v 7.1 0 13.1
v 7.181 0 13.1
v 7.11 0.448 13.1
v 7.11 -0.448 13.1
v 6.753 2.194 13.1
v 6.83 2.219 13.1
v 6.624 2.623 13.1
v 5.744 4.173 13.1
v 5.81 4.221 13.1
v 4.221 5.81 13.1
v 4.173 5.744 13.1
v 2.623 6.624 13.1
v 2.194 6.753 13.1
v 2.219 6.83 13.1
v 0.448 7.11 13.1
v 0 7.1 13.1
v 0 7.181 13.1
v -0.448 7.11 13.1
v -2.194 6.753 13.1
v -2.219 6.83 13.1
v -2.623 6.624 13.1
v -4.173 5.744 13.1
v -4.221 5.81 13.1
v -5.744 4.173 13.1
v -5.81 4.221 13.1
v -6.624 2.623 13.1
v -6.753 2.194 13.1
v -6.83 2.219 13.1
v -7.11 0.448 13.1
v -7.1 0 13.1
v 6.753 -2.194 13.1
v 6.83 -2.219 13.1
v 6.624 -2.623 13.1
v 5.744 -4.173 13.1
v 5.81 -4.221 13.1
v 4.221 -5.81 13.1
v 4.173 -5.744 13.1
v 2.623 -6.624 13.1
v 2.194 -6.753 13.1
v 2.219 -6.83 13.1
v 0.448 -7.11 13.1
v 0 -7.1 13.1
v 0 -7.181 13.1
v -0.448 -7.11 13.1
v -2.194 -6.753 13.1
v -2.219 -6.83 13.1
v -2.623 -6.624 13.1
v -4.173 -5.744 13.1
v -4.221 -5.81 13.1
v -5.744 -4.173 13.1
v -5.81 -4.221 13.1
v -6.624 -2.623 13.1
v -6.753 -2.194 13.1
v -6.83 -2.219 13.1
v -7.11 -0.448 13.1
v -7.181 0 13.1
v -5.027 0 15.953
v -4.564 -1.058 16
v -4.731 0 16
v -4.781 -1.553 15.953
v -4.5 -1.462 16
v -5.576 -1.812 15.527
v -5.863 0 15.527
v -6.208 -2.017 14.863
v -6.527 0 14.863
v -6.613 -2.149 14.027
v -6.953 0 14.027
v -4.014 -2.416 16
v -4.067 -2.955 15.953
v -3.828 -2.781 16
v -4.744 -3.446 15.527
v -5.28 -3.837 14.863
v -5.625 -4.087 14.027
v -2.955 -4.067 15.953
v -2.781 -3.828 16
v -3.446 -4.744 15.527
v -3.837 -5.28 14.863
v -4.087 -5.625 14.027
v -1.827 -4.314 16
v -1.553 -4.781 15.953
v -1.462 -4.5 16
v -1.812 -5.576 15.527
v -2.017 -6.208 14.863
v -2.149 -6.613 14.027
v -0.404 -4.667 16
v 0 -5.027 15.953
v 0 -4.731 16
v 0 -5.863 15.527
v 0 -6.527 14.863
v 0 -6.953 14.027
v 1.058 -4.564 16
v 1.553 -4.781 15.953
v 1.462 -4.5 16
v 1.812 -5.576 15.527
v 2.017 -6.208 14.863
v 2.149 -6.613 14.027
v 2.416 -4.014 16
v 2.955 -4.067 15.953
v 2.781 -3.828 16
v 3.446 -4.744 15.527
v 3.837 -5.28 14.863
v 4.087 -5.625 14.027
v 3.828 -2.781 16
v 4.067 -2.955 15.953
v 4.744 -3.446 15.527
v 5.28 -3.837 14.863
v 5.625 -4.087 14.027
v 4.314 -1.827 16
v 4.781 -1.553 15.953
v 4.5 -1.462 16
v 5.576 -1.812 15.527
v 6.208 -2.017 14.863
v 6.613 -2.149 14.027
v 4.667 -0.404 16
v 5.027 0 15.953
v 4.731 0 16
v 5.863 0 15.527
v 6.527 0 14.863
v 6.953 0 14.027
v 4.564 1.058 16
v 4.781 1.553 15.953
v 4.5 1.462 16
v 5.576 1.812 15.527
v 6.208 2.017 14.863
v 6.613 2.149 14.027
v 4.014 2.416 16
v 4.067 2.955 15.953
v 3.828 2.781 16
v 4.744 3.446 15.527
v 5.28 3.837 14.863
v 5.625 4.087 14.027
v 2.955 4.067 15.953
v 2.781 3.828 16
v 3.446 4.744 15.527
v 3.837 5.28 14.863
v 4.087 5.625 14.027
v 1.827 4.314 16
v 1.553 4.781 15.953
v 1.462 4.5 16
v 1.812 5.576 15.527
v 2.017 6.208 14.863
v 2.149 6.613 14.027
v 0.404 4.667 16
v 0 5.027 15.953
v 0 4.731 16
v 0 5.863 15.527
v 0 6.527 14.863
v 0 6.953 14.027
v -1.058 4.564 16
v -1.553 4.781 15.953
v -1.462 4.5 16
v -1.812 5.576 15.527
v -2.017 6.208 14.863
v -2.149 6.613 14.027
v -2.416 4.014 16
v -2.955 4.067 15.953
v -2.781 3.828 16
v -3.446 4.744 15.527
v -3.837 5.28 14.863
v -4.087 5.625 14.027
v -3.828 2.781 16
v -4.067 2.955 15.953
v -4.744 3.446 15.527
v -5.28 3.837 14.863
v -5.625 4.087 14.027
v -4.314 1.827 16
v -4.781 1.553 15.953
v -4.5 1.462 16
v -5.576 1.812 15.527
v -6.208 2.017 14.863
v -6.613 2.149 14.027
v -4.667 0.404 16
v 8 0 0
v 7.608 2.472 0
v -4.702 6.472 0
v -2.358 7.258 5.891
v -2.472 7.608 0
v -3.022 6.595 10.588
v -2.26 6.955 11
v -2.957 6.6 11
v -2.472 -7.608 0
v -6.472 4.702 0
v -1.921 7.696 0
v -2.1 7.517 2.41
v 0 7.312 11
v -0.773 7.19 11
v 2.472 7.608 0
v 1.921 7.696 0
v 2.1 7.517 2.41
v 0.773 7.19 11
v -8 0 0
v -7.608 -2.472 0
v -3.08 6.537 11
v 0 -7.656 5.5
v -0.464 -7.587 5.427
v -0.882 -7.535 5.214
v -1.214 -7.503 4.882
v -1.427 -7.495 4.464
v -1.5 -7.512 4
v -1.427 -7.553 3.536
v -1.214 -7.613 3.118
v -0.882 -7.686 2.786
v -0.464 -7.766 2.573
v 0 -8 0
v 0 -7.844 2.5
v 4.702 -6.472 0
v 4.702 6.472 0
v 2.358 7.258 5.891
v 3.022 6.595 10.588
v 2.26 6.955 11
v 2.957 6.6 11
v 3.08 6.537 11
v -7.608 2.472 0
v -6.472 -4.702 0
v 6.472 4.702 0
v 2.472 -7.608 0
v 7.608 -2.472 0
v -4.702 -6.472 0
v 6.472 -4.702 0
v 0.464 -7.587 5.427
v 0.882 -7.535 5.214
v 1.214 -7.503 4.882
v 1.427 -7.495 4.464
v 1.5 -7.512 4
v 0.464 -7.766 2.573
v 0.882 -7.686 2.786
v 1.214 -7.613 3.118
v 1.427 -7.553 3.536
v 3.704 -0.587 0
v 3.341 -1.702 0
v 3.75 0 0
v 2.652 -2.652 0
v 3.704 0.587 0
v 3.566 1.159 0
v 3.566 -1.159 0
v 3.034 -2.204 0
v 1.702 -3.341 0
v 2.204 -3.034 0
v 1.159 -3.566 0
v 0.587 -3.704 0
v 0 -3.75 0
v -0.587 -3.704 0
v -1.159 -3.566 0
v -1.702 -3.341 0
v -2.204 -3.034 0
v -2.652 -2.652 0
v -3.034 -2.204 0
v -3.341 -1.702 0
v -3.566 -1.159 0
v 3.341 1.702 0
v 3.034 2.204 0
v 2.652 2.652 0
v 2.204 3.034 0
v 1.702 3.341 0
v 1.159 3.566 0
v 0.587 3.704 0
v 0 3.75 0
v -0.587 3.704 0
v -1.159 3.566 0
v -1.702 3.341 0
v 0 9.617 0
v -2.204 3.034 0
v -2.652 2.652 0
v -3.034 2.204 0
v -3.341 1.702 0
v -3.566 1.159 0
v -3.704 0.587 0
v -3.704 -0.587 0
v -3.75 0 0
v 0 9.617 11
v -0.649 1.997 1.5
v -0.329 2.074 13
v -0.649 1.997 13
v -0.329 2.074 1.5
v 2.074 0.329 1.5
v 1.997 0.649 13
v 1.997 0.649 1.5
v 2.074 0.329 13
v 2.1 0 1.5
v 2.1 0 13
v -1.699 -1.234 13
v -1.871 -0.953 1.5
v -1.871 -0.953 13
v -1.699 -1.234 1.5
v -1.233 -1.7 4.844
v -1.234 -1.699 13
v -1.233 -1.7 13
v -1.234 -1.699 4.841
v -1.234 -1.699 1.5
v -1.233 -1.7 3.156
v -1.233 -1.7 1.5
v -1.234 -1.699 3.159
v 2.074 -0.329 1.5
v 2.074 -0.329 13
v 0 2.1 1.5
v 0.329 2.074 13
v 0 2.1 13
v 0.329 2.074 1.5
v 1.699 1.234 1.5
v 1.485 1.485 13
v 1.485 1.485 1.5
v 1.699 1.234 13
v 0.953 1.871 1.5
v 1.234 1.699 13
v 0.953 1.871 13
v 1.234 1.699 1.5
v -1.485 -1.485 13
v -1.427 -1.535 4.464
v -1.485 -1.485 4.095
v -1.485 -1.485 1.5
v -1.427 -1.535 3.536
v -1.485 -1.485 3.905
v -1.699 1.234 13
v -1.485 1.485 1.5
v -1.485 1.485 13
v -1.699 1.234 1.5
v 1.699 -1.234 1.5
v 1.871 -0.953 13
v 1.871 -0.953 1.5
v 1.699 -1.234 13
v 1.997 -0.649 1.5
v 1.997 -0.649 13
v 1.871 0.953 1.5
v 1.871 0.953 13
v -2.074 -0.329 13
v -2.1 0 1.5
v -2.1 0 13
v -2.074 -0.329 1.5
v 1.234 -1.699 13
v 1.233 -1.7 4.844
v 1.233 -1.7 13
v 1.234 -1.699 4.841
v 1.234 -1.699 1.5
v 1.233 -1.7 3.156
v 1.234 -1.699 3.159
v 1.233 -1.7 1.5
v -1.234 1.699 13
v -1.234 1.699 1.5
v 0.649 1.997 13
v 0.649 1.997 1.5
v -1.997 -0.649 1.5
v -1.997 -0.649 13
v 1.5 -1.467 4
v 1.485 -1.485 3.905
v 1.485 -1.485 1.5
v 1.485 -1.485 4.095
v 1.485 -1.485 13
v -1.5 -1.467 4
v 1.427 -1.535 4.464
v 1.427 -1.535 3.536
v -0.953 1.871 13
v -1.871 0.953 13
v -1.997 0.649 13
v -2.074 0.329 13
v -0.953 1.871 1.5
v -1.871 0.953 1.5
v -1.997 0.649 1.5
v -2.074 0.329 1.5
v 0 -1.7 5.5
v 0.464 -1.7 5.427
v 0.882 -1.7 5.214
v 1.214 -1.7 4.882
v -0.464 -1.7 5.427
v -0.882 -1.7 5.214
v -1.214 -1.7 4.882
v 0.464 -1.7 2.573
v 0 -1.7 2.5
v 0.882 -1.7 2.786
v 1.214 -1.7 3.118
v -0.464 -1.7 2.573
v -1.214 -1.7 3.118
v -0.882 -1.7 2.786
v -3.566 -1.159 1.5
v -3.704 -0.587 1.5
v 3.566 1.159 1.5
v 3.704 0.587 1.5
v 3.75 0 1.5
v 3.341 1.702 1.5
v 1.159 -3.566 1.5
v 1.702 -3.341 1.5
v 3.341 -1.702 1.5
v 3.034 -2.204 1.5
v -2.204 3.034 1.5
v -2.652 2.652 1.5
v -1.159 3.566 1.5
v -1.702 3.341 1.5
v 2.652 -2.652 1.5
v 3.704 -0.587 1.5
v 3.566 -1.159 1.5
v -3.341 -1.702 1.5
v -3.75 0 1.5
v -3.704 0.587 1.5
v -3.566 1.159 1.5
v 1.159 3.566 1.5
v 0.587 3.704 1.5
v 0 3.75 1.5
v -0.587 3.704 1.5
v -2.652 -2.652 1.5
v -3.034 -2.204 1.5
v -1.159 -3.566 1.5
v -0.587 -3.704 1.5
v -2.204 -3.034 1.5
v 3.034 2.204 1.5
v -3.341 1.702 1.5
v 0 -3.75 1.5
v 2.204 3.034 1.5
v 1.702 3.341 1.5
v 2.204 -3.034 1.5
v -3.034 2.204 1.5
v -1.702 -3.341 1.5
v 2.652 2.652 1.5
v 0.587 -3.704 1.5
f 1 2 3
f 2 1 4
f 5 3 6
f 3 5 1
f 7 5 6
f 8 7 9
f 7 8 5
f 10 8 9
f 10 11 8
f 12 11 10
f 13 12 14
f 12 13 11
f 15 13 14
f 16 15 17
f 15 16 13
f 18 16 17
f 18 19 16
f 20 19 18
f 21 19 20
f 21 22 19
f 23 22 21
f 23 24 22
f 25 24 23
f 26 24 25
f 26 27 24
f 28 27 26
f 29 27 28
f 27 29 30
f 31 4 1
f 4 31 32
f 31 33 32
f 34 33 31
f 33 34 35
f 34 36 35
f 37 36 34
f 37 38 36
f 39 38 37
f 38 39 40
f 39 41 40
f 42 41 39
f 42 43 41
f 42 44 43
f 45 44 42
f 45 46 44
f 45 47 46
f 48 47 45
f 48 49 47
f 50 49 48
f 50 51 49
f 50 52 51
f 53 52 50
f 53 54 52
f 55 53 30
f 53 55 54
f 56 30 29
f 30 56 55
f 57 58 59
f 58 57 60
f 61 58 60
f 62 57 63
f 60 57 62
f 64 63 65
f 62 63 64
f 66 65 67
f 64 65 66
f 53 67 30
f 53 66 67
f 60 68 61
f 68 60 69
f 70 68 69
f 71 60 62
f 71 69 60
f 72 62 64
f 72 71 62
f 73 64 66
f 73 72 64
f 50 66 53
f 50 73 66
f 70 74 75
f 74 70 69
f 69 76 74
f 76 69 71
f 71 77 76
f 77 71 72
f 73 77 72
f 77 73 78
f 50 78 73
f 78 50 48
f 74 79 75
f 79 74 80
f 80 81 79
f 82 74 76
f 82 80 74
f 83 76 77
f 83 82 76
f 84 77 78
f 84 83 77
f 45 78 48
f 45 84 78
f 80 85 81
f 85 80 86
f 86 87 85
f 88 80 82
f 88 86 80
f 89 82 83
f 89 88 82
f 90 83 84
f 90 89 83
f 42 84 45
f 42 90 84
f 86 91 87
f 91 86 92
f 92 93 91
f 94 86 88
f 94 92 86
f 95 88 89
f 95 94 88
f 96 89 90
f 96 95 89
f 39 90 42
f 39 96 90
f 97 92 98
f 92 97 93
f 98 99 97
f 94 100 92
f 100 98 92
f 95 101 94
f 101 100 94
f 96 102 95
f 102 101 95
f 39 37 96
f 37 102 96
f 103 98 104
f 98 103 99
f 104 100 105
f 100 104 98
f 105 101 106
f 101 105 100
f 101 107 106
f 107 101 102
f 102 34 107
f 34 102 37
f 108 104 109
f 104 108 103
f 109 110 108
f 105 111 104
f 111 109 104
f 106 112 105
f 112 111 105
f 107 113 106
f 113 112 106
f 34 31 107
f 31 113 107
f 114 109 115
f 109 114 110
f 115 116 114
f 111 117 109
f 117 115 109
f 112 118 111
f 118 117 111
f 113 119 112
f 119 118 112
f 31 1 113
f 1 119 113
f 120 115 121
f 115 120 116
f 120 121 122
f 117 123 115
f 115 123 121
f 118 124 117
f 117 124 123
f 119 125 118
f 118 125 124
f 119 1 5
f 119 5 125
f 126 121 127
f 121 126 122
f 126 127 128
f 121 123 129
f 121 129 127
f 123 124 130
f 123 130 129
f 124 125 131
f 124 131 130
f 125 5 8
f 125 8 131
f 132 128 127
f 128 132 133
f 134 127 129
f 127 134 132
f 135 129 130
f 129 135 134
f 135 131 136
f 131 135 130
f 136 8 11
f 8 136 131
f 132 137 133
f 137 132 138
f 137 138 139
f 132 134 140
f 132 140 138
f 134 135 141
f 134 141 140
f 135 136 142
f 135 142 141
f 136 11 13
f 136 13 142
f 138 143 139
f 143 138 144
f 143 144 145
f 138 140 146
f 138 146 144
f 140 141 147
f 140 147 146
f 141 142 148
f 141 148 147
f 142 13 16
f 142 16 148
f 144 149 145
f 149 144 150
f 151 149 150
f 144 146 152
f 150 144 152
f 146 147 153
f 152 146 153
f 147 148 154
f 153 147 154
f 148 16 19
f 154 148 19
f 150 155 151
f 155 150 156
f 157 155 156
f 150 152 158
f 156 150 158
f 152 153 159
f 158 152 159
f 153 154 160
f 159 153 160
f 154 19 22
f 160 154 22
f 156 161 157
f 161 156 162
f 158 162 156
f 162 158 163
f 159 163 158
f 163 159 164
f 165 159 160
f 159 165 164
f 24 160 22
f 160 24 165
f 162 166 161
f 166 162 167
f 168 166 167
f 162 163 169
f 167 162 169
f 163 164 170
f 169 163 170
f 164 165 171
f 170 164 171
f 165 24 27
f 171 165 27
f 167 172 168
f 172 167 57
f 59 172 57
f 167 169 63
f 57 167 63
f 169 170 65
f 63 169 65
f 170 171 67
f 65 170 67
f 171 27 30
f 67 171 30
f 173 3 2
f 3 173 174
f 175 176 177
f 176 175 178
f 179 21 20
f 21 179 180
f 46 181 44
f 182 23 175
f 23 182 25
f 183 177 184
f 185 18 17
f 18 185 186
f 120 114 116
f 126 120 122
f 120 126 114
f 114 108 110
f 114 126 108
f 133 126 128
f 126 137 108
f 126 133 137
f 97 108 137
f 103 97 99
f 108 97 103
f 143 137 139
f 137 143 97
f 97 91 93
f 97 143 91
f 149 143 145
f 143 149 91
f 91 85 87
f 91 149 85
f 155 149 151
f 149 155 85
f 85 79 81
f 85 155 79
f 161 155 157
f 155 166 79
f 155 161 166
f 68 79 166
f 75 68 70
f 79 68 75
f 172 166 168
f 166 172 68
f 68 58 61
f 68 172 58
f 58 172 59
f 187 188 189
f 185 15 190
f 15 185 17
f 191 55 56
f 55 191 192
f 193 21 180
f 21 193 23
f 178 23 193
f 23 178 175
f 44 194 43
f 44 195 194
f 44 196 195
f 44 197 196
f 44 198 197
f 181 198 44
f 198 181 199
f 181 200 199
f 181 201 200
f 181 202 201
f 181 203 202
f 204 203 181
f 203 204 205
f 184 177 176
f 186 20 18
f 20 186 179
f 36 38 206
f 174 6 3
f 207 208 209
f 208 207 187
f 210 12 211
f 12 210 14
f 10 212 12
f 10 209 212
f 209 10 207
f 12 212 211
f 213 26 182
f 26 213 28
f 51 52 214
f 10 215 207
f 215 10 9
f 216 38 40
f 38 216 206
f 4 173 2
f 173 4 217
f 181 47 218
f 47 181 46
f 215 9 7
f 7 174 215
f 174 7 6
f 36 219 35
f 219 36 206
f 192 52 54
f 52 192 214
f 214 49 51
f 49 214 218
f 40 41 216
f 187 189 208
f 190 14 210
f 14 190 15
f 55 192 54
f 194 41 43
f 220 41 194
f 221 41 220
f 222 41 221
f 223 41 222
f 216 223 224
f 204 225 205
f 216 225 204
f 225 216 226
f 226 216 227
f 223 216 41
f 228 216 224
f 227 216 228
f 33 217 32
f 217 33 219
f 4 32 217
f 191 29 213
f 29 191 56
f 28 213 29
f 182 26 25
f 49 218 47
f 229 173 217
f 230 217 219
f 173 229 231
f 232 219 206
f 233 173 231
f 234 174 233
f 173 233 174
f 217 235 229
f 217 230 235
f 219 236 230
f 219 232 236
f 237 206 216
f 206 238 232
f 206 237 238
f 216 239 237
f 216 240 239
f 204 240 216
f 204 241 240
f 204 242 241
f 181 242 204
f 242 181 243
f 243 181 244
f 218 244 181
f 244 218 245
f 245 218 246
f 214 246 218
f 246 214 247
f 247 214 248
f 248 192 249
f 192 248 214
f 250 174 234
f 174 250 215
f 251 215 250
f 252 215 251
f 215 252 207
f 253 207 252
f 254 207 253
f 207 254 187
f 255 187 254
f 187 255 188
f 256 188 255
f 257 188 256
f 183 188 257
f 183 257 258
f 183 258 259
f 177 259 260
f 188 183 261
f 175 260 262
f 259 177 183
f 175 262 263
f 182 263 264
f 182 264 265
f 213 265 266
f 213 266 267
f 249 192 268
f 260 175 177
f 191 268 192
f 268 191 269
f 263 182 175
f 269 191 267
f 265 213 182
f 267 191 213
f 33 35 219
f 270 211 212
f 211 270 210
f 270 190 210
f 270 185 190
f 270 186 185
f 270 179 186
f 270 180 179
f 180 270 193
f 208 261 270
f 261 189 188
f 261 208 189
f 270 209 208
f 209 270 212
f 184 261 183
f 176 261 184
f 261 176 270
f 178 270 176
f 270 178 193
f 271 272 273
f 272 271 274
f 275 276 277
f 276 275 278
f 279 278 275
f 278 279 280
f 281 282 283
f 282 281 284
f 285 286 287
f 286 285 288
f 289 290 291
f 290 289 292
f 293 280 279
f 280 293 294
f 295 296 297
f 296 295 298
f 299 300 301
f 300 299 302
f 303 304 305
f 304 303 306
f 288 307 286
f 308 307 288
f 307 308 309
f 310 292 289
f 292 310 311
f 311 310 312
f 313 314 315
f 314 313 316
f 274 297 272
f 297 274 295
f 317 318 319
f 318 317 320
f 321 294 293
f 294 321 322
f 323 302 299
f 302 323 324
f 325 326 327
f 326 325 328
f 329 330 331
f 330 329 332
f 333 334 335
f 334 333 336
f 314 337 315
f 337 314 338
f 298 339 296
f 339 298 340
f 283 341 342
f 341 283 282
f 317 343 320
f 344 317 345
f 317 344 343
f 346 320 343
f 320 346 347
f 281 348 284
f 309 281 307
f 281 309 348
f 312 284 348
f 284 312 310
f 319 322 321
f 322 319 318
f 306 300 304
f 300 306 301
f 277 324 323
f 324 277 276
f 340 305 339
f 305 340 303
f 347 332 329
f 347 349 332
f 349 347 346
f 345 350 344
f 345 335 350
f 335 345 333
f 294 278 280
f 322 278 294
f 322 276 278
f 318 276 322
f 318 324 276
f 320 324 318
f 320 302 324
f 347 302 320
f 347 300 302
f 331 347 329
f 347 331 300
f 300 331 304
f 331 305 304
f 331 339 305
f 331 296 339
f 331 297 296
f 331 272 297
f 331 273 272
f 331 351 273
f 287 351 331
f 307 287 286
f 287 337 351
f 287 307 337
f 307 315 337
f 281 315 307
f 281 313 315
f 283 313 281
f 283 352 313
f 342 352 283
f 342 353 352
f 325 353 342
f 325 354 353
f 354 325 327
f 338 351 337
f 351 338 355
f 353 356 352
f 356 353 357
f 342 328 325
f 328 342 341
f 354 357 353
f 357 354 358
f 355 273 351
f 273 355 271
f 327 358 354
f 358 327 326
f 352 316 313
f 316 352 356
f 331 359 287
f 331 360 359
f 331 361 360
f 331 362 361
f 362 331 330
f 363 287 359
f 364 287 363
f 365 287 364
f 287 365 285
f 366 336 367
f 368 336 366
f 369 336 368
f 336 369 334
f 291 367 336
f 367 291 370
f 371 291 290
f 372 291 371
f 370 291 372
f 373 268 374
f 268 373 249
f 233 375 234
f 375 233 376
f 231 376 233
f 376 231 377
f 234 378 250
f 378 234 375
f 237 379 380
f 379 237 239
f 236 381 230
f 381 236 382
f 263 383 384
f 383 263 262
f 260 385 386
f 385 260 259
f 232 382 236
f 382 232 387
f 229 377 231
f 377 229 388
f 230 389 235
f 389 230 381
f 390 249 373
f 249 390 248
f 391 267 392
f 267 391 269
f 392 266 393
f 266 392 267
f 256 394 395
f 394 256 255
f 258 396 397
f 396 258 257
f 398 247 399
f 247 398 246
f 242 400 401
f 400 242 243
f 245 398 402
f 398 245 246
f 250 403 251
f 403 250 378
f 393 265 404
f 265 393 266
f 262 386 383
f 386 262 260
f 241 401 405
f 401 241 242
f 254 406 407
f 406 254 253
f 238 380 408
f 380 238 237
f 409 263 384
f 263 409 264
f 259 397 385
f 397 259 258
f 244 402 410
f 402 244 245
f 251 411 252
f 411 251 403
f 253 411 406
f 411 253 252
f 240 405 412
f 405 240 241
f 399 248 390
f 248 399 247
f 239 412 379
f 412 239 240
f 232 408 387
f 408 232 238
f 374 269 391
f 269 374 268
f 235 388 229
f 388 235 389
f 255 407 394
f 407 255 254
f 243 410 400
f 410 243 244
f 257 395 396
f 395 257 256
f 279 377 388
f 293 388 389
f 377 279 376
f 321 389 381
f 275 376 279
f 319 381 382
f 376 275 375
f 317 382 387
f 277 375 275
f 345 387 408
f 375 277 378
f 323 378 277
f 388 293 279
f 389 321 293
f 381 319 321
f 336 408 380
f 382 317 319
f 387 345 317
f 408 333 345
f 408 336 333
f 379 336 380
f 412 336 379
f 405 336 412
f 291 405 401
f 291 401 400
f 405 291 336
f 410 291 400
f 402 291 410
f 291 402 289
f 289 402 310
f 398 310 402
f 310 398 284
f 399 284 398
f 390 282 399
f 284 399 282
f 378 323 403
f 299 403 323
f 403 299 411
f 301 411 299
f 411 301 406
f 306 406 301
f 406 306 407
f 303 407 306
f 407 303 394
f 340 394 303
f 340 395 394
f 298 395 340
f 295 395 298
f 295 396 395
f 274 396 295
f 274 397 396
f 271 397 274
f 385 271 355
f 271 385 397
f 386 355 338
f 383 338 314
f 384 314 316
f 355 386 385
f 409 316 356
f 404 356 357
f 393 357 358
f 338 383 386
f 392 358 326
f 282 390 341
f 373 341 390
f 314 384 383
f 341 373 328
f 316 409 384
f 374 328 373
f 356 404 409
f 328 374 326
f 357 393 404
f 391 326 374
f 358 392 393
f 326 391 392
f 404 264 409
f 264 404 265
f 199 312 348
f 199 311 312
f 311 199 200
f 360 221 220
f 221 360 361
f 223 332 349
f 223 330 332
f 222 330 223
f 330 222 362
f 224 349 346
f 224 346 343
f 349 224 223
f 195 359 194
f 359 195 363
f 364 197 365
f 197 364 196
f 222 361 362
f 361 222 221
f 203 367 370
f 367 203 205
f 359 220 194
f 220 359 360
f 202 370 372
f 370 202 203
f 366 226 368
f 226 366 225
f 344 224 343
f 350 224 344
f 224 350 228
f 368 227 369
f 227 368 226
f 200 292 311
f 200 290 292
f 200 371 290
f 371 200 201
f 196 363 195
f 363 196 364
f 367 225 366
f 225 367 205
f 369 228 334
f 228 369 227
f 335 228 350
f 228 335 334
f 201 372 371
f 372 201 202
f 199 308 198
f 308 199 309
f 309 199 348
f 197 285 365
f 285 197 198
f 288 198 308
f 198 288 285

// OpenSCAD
/*

Parametric Potentiometer Knob Generator
version 1.1
2012 Steve Cooley
http://sc-fa.com
http://beatseqr.com
http://hapticsynapses.com

parametric potentiometer knob generator by steve cooley is licensed under a Creative Commons Attribution-NonCommercial-ShareAlike 3.0 Unported License. Based on a work at sc-fa.com. Permissions beyond the scope of this license may be available at http://sc-fa.com/blog/contact.

view terms of the license here:
http://creativecommons.org/licenses/by-nc-sa/3.0/


version history
---------------
1.1 2012-04-12 fixed the arrow indicator code to be more robust and easier to adjust parameters for.
1.0 2012-03-?? initial release.


*/


//
//
// Physical attributes, basic
//
//

knob_radius_top = 7;
knob_radius_bottom = 8;
knob_height = 16;
knob_smoothness = 20;

outer_shaft=true;
outer_shaft_radius = 3.75;
outer_shaft_height = 2.5;
outer_shaft_smoothness = 40;

shaft_radius = 2.1;
shaft_height = 14;
shaft_smoothness = 40;

outer_shaft_is_flatted = false;
shaft_is_flatted = true;
flat_size_adjustment = -0.0;
// you won't need to mess with this. less than 5 makes it disappear. you can, however,
// set the adjustment to be a negative decimal if you need a flat but not as big as the default. 
// go positive if you need a bigger flat
flat_size = 5.8 + flat_size_adjustment;

// some potentiometers need to have their knobs affixed with a set screw.
set_screw = true;
set_screw_radius = 1.5;
set_screw_depth = 11;
set_screw_height = 4;
quality_of_set_screw = 20;

//
// 
// Decorations
//
//

//
// top edge smoothing
// thanks to http://www.iheartrobotics.com/ for the articles!
//

smoothing = true;
smoothing_radius = 3;				// tweak on this one, how much smoothing to apply
smooth = 20;						// tweak on this one, Number of facets of rounding cylinder

ct = -0.1; 							// circle translate? not sure.
circle_radius = knob_radius_top;  	// just match the top edge radius
circle_height = 1; 					// actually.. I don't know what this does.
pad = 0.2;							// Padding to maintain manifold


//
// directional indicators
//

// this is a corner edge of a cube sticking out of the cylinder at the bottom
// you can use it instead of the arrow shaped cutout in the top if you like. Or both.

pointy_external_indicator = true;
pointy_external_indicator_height = 11;
pointy_external_indicator_pokey_outey_ness = -0.0; // 
pokey_outey_value = pointy_external_indicator_pokey_outey_ness - 1 - pad;
pokey_outey = [pokey_outey_value, pokey_outey_value,0];

// there's an arrow shaped hole you can have. There aren't a lot of controls for this.
// please feel free to improve on this script here.

arrow_indicator = false;
arrow_indicator_scale = 1.3;
arrow_indicator_translate = [0,1,16];
arrow_scale_head = 2;
arrow_scale_shaft = 1.5;

//
// indentations
//

// for spherical indentations, set the quantity, quality, size, and adjust the placement
indentations_sphere = false;
sphere_number_of_indentations = 12;
sphere_quality_of_indentations = 4;
size_of_sphere_indentations = 4;
// the first number in this set moves the spheres in or out. smaller is closer to the middle
// the second number in this set moves the spheres left or right
// the third number in this set moves the speheres up or down
translation_of_sphere_indentations = [10,0,15];
// in case you are using an odd number of indentations, you way want to adjust the starting angle
// so that they align to the front or set screw locations.
sphere_starting_rotation = 90;

// for cylinder indentations, set quantity, quality, radius, height, and placement
indentations_cylinder = false;
cylinder_number_of_indentations = 10;
cylinder_quality_of_indentations = 50;
radius_of_cylinder_indentations_top = 3;
radius_of_cylinder_indentations_bottom = 5;
height_of_cylinder_indentations = 12;
translation_of_cylinder_indentations = [0,8,-8];
cylinder_starting_rotation = -33.3;

// these are some setup variables... you probably won't need to mess with them.
negative_knob_radius = knob_radius_bottom*-1;


// this is the main module. It calls the submodules.
make_the_knob();

module make_the_knob()
{
	difference()
		{
		difference()
			{
		
			difference() 
				{
				difference() 
					{
					
					union()
						{
						
						difference()
							{
							// main cylinder
							cylinder(r1=knob_radius_bottom,r2=knob_radius_top,h=knob_height, $fn=knob_smoothness);
							
							smoothing();				
		
							}
				
						external_direction_indicator();	
						}
					if(outer_shaft){
						outer_shaft_hole();
					}
					shaft_hole();
					}
					
				set_screw_hole();
				}
			
			arrow_indicator();
			indentations();
		}
	}

}

module smoothing() {

// smoothing the top
				if(smoothing == true)
					{		
						translate([0,0,knob_height])
						rotate([180,0,0])
						difference() {
							rotate_extrude(convexity=10,  $fn = smooth)
							translate([circle_radius-ct-smoothing_radius+pad,ct-pad,0])
							square(smoothing_radius+pad,smoothing_radius+pad);
	
							rotate_extrude(convexity=10,  $fn = smooth)
							translate([circle_radius-ct-smoothing_radius,ct+smoothing_radius,0])
							circle(r=smoothing_radius,$fn=smooth);
							}	
					}
}

module external_direction_indicator() {

				if(pointy_external_indicator == true)
						{
						
						
						// outer pointy indicator
						rotate([0,0,45])
						translate(pokey_outey)
						// cube size of 8 minimum to point out
						cube(size=[knob_radius_bottom,knob_radius_bottom,pointy_external_indicator_height],center=false);
						}

}

module outer_shaft_hole() {
				// shaft hole
				difference()
					{
					
					// round shaft hole
					translate([ 0, 0, -1 ]) 
					cylinder(r=outer_shaft_radius,h=outer_shaft_height, $fn=outer_shaft_smoothness);
					
					if(outer_shaft_is_flatted == true)
						{
						// D shaft shape for shaft cutout
						rotate( [0,0,90]) 
						translate([-7.5,-5,0]) 
						cube(size=[flat_size,10,13],center=false);
						}
					}
}

module shaft_hole() {
				// shaft hole
				difference()
					{
					
					// round shaft hole
					translate([ 0, 0, -1 ]) 
					cylinder(r=shaft_radius,h=shaft_height, $fn=shaft_smoothness);
					
					if(shaft_is_flatted == true)
						{
						// D shaft shape for shaft cutout
						rotate( [0,0,90]) 
						translate([-7.5,-5,0]) 
						cube(size=[flat_size,10,13],center=false);
						}
					}
}


module set_screw_hole() {

			if(set_screw == true)
				{
				// set screw hole
				rotate ([90,0,0])
				translate([ 0, set_screw_height, 1 ])
				cylinder(r=set_screw_radius,h=set_screw_depth, $fn=quality_of_set_screw);
				}
}

module arrow_indicator() {
		if(arrow_indicator == true)
			{
			translate(arrow_indicator_translate)
			// begin arrow top cutout
			// translate([(knob_radius/2),knob_height,knob_height])
			rotate([90,0,45])
			scale([arrow_indicator_scale*.3,arrow_indicator_scale*.3,arrow_indicator_scale*.3])
			union()
				{			  
				rotate([90,45,0])
				scale([arrow_scale_head,arrow_scale_head,1])
				cylinder(r=8, h=10, $fn=3, center=true);
				rotate([90,45,0])
				translate([-10,0,0])
				scale([arrow_scale_shaft,arrow_scale_shaft,1])
				cube(size=[15,10,10],center=true);
				}
			}
}

module indentations() {

if(indentations_sphere == true)
			{
			for (z = [0:sphere_number_of_indentations]) 
				{
				rotate([0,0,sphere_starting_rotation+((360/sphere_number_of_indentations)*z)])
				translate(translation_of_sphere_indentations)
				sphere(size_of_sphere_indentations, $fn=sphere_quality_of_indentations); 
				}
			}
if(indentations_cylinder == true)
			{
			for (z = [0:cylinder_number_of_indentations]) 
				{
				rotate([0,0,cylinder_starting_rotation+((360/cylinder_number_of_indentations)*z)])
				
				translate([negative_knob_radius,0,knob_height])
				translate(translation_of_cylinder_indentations)
				cylinder(r1=radius_of_cylinder_indentations_bottom, r2=radius_of_cylinder_indentations_top, h=height_of_cylinder_indentations, center=true, $fn=cylinder_quality_of_indentations); 
				}
			}
		}
